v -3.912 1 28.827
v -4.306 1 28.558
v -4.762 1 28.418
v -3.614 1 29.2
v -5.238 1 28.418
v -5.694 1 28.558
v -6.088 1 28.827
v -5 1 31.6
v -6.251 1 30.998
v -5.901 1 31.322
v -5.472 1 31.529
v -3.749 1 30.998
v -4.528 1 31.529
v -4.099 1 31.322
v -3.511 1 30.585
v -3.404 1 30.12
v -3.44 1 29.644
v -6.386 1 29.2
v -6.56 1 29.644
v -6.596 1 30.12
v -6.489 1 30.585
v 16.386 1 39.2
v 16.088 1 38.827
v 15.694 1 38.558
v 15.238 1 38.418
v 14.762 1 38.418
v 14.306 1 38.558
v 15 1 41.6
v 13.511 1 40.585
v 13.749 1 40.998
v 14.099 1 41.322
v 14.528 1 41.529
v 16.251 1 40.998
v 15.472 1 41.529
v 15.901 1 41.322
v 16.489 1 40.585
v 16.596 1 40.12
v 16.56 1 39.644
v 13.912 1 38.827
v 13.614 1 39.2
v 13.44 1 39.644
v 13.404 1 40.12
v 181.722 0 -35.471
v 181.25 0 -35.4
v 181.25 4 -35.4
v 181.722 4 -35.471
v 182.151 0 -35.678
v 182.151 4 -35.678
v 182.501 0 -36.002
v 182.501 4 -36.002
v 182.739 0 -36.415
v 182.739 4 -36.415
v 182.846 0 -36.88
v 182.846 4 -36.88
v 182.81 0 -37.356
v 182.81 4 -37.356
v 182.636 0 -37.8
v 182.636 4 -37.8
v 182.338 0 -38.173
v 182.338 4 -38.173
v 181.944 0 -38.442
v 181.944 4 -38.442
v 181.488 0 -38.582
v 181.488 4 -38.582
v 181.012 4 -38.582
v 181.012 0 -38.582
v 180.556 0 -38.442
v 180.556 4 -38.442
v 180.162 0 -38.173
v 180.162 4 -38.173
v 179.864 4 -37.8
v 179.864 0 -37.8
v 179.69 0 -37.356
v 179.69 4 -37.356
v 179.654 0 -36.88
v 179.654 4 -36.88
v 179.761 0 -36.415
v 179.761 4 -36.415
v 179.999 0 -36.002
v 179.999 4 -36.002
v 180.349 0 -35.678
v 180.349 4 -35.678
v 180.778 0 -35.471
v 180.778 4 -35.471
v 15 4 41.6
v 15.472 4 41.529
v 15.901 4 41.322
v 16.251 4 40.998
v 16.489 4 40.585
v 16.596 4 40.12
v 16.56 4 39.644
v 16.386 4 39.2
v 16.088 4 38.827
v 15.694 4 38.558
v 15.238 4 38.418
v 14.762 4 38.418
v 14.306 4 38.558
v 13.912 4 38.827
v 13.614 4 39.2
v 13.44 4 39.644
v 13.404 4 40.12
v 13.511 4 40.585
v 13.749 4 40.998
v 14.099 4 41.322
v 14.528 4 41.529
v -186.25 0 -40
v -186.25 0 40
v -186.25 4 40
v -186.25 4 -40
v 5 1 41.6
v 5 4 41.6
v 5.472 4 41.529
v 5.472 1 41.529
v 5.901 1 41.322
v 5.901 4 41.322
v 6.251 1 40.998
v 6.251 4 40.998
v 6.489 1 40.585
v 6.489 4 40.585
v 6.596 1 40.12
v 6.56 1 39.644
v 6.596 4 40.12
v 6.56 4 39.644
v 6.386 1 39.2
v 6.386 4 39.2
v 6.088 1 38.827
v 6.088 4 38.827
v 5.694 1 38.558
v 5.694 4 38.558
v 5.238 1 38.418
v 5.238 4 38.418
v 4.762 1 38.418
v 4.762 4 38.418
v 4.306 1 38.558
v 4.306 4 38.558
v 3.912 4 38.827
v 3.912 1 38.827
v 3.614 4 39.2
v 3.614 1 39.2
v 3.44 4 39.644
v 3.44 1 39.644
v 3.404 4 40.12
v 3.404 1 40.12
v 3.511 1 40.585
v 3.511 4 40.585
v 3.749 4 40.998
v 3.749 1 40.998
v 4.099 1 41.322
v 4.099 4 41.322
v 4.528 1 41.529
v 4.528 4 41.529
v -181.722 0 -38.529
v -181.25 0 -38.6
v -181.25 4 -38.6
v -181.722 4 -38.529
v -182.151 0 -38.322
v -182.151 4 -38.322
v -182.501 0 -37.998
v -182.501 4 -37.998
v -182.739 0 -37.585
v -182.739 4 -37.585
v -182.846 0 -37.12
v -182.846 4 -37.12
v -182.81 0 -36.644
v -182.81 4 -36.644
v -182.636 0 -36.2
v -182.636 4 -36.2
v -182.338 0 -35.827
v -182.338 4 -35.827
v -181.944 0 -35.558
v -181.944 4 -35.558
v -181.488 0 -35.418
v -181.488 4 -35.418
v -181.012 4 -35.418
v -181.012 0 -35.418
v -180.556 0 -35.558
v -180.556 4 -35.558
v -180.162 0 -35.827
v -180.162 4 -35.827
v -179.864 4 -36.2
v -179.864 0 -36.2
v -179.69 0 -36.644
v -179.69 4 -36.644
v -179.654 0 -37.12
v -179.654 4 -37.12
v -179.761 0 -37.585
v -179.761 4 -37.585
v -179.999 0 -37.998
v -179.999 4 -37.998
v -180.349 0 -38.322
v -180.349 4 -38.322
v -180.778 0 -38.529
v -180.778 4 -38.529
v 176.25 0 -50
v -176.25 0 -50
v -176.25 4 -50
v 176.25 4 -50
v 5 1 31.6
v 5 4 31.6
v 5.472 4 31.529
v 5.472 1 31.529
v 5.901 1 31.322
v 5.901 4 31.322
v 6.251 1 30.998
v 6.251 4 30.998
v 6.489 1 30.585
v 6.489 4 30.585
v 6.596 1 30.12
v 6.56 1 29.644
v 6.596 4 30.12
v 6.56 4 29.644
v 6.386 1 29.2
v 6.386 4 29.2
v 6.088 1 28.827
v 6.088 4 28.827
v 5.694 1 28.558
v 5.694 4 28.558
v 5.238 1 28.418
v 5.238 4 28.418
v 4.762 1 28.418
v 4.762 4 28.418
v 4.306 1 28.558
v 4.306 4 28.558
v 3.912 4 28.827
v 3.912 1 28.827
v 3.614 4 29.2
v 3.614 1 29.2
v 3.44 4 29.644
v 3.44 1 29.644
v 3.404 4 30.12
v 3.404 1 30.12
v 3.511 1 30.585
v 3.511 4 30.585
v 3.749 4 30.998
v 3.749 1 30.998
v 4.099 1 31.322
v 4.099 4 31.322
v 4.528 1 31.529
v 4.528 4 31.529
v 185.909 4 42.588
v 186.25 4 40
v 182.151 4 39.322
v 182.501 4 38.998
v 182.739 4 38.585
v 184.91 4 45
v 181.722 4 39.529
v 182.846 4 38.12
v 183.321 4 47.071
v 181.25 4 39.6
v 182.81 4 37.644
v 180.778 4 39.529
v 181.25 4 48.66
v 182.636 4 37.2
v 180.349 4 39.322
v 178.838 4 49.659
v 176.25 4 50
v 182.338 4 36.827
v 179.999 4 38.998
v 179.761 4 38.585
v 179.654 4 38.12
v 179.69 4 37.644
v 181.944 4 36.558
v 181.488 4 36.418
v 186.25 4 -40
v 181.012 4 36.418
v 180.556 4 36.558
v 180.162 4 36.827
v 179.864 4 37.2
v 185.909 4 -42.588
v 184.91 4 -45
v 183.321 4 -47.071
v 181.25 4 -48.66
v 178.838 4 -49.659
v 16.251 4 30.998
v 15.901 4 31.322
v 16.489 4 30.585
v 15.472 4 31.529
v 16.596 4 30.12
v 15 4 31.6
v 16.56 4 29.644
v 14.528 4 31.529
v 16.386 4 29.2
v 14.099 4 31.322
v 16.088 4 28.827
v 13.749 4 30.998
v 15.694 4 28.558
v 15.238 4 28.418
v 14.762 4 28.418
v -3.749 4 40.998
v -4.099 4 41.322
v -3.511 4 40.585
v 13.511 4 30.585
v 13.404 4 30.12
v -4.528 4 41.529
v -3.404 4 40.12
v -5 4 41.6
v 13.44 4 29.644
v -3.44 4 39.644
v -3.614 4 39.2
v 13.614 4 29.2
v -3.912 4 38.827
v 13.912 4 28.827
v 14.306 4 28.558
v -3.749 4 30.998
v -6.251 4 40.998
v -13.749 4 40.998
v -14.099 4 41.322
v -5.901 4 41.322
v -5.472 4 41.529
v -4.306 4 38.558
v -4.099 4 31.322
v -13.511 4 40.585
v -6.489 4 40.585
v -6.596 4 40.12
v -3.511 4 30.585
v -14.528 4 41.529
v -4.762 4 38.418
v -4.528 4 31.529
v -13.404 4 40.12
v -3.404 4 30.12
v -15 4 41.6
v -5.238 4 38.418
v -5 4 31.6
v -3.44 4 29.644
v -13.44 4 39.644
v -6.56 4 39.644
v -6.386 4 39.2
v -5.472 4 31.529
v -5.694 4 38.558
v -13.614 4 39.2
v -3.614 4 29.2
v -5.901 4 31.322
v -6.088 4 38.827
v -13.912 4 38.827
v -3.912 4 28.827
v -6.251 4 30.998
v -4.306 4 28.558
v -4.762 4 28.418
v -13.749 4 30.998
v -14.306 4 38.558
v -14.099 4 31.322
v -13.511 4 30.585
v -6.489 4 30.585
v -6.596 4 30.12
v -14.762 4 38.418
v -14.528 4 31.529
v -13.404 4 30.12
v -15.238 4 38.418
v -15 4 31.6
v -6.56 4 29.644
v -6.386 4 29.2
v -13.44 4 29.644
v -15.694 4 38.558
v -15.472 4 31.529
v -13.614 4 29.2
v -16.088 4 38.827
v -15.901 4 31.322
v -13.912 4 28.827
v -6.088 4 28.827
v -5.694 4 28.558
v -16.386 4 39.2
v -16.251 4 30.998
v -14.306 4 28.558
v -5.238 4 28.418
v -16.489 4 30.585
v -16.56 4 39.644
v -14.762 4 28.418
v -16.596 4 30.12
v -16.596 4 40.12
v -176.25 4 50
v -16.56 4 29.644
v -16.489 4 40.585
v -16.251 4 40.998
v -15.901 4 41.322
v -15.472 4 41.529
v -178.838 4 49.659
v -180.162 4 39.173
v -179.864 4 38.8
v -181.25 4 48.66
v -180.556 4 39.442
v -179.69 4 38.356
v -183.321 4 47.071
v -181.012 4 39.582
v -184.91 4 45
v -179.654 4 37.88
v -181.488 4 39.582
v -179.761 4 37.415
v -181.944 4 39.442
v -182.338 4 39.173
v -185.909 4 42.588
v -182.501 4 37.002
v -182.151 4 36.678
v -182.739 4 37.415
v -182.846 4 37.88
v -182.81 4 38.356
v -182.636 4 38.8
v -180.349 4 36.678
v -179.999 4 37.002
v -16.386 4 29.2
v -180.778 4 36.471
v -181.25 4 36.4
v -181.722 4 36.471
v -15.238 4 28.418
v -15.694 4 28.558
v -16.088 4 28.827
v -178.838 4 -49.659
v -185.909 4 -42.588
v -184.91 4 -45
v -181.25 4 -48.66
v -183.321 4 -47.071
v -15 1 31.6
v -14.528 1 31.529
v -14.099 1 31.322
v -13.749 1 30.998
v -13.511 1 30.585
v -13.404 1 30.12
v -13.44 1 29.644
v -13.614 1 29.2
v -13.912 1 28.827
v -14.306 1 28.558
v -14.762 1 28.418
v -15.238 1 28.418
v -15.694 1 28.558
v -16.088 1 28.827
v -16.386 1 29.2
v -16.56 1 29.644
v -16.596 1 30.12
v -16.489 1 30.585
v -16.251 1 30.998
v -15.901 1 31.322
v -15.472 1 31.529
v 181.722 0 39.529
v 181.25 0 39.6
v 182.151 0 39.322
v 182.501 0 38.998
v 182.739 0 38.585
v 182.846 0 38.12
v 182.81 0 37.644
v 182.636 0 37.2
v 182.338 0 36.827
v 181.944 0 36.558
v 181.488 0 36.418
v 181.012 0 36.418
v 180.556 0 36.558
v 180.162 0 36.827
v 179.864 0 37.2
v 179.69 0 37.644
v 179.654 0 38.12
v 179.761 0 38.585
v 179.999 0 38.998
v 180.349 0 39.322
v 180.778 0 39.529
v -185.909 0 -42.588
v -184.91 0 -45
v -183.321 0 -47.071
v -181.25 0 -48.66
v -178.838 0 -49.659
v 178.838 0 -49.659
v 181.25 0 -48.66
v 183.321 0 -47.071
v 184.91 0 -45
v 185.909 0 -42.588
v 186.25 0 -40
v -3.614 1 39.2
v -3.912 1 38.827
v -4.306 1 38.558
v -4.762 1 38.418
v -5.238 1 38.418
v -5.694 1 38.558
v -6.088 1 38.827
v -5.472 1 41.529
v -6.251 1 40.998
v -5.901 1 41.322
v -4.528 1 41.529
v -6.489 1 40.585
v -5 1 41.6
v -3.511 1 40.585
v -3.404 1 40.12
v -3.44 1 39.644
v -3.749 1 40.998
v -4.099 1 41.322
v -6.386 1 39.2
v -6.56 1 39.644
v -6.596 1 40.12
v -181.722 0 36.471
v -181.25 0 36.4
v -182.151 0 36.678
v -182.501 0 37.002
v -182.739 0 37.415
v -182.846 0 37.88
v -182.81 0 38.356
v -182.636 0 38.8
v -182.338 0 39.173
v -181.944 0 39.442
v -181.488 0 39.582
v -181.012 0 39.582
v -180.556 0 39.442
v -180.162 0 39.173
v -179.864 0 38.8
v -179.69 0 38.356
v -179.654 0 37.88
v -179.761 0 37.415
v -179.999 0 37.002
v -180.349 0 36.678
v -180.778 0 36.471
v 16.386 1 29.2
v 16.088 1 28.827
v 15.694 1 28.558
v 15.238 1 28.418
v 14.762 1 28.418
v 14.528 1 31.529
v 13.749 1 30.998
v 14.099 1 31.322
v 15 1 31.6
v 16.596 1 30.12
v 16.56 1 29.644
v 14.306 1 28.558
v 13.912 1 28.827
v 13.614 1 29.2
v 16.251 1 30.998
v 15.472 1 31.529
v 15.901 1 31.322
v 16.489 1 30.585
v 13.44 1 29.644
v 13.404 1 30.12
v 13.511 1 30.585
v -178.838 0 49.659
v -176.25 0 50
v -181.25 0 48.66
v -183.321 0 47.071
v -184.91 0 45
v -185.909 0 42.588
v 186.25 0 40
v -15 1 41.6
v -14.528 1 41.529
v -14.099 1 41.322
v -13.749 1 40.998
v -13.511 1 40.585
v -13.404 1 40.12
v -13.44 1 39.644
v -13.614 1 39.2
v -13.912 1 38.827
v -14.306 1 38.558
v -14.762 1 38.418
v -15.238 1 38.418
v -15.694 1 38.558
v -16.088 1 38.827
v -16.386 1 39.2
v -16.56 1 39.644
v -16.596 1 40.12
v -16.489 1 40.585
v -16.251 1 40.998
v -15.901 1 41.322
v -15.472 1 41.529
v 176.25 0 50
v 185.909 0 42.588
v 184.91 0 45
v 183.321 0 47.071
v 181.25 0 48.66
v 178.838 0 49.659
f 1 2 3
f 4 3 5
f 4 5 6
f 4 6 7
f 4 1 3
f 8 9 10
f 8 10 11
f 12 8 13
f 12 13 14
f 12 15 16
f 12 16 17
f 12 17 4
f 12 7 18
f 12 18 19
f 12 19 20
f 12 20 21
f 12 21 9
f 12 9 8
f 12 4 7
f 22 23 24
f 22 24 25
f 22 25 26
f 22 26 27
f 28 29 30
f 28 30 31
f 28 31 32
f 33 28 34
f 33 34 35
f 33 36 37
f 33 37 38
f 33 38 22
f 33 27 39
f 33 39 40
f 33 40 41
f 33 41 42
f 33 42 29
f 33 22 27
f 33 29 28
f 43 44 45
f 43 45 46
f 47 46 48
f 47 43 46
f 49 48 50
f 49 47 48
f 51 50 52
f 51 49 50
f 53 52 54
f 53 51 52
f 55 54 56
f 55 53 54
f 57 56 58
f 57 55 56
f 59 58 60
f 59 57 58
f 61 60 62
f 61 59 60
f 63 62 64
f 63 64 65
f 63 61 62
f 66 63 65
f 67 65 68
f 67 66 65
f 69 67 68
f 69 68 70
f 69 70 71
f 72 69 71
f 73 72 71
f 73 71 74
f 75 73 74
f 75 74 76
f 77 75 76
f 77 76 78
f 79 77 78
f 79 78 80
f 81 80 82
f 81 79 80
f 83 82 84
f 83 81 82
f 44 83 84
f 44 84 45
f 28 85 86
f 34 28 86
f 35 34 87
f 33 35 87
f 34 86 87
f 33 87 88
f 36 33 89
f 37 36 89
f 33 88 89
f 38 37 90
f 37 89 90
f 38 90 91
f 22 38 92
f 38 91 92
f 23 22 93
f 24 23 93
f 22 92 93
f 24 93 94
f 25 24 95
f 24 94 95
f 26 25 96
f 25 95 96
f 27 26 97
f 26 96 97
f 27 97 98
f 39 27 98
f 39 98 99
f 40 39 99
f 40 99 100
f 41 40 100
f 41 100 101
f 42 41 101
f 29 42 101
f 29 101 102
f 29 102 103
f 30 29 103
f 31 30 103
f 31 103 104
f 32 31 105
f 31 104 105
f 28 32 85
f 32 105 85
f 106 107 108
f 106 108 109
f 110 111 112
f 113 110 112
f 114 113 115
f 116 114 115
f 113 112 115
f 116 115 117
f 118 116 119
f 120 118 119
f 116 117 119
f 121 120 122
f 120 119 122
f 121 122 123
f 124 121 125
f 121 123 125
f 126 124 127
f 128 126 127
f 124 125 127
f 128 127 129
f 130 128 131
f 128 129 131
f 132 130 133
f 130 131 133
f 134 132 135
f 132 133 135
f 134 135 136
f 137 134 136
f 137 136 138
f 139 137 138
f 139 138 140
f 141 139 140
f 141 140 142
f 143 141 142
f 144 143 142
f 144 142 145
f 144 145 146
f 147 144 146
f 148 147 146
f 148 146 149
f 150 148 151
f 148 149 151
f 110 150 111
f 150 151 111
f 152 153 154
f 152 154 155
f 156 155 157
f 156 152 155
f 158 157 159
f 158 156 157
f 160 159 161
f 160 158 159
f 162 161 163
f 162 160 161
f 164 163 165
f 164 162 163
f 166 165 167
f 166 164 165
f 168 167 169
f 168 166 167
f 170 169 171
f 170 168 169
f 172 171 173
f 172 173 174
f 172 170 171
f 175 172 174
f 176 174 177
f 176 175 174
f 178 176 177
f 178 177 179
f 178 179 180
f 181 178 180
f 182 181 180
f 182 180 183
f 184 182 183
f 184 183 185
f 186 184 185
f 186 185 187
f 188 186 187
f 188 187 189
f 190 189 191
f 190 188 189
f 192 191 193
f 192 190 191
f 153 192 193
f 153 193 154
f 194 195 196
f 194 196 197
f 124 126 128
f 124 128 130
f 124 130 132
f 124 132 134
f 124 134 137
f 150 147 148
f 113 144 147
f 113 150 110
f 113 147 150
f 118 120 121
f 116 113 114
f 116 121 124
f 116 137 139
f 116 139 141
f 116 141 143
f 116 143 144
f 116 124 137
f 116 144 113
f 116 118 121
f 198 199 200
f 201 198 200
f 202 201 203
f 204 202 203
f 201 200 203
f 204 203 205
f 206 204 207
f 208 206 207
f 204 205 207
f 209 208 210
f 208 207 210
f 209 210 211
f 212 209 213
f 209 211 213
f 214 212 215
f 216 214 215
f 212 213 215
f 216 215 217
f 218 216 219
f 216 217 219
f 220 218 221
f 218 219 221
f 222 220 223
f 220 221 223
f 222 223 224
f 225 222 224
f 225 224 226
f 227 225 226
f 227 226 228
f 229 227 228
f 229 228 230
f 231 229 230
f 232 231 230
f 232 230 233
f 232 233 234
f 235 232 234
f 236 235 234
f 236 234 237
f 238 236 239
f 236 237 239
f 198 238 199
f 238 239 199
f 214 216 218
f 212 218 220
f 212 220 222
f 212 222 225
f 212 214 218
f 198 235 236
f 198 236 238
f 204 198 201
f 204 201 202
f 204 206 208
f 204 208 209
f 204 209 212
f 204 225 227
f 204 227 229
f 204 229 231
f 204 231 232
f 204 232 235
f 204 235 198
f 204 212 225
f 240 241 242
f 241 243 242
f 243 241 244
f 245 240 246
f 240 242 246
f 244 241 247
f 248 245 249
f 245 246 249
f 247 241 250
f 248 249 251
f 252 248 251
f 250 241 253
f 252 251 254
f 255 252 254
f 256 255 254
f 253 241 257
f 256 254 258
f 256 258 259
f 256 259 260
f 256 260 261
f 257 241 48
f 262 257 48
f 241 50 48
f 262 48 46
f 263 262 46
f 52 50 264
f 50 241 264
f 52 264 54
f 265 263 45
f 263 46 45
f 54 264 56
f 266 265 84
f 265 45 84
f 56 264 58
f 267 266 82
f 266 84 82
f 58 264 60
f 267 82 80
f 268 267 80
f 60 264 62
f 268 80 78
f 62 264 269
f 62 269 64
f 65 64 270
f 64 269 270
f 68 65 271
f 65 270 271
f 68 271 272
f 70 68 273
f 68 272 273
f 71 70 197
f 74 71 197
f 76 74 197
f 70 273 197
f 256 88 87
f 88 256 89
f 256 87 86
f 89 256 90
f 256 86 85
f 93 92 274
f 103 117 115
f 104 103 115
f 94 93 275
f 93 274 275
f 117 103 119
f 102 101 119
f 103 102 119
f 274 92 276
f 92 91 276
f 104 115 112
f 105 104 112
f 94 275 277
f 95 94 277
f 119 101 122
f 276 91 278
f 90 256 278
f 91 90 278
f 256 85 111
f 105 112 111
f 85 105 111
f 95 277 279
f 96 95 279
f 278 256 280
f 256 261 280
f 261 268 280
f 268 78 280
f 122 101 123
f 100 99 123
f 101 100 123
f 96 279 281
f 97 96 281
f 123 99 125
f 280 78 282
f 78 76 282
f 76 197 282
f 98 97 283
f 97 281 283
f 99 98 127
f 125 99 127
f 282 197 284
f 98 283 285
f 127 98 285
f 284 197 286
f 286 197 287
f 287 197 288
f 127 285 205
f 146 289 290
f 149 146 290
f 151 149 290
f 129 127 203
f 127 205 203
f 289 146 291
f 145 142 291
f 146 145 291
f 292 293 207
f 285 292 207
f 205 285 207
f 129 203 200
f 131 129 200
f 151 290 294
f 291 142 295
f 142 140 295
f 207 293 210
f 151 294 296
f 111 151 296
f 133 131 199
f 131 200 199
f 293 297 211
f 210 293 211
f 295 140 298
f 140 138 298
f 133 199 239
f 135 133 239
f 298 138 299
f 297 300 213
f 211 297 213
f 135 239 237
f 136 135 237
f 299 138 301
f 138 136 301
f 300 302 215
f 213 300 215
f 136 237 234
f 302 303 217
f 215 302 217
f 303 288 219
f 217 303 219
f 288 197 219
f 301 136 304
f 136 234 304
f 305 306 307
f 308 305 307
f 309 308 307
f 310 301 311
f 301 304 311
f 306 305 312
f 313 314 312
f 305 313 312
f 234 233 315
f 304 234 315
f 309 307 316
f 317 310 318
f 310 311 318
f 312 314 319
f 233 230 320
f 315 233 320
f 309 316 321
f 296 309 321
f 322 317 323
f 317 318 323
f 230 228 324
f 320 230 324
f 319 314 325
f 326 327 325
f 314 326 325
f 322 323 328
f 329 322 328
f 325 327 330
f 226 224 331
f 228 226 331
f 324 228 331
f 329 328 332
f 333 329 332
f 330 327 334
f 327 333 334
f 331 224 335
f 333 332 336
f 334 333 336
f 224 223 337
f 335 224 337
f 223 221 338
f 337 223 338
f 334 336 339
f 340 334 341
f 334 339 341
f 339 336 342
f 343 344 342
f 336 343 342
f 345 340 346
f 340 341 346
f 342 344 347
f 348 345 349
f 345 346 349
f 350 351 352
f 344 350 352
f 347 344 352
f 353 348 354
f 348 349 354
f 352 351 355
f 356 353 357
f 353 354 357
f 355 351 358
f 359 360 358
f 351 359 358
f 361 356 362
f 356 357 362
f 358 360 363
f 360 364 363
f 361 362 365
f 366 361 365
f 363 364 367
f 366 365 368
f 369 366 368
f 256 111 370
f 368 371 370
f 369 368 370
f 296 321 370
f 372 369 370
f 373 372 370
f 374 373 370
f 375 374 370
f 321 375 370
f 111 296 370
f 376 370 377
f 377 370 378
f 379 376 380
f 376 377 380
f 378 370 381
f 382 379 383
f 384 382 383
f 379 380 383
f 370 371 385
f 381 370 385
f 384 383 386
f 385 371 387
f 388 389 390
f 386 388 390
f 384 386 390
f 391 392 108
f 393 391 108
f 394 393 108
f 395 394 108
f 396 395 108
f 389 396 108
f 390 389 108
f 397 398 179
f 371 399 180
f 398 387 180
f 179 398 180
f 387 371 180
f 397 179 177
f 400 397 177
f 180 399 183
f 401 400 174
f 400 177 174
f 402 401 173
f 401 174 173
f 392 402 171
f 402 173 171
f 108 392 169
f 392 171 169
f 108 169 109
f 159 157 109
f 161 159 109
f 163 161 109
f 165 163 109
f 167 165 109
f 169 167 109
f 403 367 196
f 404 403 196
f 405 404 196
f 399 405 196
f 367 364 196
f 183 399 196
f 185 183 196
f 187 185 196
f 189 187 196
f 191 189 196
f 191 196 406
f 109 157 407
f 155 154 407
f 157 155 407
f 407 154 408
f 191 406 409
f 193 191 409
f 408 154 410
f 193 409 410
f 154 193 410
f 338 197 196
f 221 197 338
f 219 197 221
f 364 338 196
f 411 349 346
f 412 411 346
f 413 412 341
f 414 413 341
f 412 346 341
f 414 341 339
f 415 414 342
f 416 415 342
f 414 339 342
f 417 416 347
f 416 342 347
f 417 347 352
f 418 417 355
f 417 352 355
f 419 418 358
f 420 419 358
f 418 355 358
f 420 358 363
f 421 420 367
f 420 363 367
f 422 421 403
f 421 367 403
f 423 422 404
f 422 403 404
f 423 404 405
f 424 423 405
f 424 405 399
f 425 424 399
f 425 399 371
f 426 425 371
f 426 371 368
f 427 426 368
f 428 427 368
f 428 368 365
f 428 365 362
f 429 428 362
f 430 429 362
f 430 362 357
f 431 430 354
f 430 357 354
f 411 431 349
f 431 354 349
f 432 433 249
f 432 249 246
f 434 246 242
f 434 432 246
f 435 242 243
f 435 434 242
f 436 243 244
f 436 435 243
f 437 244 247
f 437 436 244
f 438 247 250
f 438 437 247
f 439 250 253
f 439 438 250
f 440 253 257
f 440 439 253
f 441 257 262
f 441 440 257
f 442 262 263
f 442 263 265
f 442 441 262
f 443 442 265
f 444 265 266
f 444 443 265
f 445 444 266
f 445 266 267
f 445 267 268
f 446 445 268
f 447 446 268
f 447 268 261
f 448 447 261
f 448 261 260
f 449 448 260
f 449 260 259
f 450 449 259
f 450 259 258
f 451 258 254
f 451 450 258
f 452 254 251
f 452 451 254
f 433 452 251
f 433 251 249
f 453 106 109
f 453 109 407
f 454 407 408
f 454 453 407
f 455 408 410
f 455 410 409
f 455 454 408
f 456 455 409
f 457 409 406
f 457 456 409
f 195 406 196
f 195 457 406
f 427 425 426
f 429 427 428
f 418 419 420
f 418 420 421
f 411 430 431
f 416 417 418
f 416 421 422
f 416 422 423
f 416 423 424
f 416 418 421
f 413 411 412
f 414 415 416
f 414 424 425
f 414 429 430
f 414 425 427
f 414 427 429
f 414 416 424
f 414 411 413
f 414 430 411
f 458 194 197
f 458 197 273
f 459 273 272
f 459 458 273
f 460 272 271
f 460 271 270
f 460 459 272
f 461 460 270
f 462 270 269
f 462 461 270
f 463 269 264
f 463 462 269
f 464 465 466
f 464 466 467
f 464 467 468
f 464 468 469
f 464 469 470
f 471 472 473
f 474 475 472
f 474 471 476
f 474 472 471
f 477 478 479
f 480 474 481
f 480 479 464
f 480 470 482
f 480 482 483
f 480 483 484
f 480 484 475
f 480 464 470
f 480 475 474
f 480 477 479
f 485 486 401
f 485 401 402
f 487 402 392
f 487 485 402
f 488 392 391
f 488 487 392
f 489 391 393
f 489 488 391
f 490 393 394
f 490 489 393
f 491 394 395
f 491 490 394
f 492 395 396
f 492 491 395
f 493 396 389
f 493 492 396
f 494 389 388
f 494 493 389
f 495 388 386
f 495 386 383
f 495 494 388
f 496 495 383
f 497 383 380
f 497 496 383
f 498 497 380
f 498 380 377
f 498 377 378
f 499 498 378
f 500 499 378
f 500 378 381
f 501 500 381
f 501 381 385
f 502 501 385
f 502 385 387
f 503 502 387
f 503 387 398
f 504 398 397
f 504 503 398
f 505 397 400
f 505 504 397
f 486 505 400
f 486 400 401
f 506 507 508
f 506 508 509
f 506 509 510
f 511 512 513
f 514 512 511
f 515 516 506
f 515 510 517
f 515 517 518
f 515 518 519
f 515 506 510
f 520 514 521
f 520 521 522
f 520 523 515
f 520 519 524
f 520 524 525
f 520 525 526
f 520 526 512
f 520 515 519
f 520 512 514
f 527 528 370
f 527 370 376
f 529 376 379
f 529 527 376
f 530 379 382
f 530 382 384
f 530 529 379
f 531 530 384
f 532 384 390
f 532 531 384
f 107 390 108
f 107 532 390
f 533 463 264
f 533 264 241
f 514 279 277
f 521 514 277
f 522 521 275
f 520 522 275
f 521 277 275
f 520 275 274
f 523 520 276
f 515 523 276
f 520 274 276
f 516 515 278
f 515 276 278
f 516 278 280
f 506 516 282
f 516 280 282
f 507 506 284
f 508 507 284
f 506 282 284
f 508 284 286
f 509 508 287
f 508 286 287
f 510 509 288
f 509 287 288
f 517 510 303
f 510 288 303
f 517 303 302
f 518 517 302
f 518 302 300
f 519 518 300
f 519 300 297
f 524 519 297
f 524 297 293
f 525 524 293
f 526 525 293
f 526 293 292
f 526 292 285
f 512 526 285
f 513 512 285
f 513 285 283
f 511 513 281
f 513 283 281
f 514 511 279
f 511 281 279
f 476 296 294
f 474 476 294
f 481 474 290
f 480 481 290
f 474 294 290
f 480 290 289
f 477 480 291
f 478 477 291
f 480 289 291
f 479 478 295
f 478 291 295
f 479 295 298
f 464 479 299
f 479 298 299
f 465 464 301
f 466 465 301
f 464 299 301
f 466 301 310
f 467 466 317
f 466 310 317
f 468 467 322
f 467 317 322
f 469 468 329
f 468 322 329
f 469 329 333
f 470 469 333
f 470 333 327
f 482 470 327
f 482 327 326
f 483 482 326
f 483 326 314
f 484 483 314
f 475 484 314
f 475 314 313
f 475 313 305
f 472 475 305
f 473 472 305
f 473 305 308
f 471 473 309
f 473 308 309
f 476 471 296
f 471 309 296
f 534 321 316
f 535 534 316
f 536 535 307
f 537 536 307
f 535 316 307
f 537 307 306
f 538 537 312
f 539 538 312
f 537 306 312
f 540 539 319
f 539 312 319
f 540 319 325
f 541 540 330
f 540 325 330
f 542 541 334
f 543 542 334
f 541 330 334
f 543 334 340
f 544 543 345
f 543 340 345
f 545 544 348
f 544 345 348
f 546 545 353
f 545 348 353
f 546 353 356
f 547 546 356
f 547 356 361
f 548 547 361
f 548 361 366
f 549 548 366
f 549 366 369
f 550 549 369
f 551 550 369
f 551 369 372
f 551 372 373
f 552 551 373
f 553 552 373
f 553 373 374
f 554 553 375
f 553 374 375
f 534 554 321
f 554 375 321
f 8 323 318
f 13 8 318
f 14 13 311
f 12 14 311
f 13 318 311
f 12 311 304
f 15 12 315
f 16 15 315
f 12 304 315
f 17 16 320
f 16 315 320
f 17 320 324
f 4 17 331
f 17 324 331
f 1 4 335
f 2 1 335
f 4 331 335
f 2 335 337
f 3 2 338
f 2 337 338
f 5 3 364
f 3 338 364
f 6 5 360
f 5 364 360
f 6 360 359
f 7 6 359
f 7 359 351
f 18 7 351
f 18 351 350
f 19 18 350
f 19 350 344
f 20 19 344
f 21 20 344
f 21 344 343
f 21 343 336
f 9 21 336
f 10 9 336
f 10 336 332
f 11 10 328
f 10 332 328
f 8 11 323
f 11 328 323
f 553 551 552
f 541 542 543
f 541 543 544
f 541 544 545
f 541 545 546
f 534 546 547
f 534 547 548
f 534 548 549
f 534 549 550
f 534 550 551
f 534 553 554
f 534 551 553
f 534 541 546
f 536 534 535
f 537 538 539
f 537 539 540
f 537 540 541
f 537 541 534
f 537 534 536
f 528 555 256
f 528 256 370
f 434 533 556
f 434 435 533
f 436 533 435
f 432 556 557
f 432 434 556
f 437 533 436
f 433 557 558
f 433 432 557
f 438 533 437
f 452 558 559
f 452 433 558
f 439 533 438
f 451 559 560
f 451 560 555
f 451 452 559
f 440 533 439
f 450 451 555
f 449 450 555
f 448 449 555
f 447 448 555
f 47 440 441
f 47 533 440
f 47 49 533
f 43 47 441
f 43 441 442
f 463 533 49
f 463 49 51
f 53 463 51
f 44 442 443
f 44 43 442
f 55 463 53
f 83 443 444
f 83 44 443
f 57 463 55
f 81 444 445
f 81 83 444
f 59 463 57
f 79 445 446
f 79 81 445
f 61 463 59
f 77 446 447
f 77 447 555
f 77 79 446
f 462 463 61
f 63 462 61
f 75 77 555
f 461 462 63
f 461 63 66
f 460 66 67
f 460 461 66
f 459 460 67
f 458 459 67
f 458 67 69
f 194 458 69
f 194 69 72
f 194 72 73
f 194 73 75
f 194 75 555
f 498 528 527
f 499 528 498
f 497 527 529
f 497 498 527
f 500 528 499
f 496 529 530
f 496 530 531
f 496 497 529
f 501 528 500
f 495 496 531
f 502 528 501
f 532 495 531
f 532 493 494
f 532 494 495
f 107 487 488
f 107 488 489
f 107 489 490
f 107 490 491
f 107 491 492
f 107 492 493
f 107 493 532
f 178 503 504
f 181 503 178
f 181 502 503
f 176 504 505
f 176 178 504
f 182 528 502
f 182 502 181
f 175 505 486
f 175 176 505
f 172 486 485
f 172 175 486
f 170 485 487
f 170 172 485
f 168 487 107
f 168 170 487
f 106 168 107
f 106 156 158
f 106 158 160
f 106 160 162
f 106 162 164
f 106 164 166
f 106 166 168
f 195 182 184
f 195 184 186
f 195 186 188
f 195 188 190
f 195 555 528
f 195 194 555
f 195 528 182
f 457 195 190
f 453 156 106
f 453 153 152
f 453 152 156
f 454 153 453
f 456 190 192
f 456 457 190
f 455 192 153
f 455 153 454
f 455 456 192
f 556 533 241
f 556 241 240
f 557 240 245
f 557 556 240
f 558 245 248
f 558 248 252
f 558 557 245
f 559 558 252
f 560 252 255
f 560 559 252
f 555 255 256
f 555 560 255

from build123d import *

# Parameters (mm, degrees)
SKETCH_1_R          = 1.6
EXTRUDE_1_DEPTH     = 4
SKETCH_2_R          = 1.6
CUT_EXTRUDE_1_DEPTH = 3


with BuildPart() as part:
    # 草图1 → 凸台-拉伸1 (new body)
    with BuildSketch(Plane(origin=(0, 0, 0), x_dir=(1, 0, 0), z_dir=(0, 1, 0))):
        with BuildLine():
            Line((-176.25, 50), (176.25, 50))
            ThreePointArc((176.25, 50), (183.321067812, 47.071067812), (186.25, 40))
            Line((186.25, 40), (186.25, -40))
            ThreePointArc((186.25, -40), (183.321067812, -47.071067812), (176.25, -50))
            Line((176.25, -50), (-176.25, -50))
            ThreePointArc((-176.25, -50), (-183.321067812, -47.071067812), (-186.25, -40))
            Line((-186.25, -40), (-186.25, 40))
            ThreePointArc((-186.25, 40), (-183.321067812, 47.071067812), (-176.25, 50))
        make_face()
        with Locations(Location((181.25, -38, 0), (0, 0, 270))):
            Circle(SKETCH_1_R, mode=Mode.SUBTRACT)
        with Locations(Location((181.25, 37, 0), (0, 0, 270))):
            Circle(SKETCH_1_R, mode=Mode.SUBTRACT)
        with Locations(Location((-181.25, -38, 0), (0, 0, 90))):
            Circle(SKETCH_1_R, mode=Mode.SUBTRACT)
        with Locations(Location((-181.25, 37, 0), (0, 0, 90))):
            Circle(SKETCH_1_R, mode=Mode.SUBTRACT)
    extrude(amount=EXTRUDE_1_DEPTH)

    # 草图2 → 切除-拉伸1 (cut)
    with BuildSketch(Plane(origin=(0, 4, 0), x_dir=(1, 0, 0), z_dir=(0, 1, 0))):
        with Locations(Location((-15, -30, 0), (0, 0, 270))):
            Circle(SKETCH_2_R)
        with Locations(Location((15, -30, 0), (0, 0, 270))):
            Circle(SKETCH_2_R)
        with Locations(Location((15, -40, 0), (0, 0, 270))):
            Circle(SKETCH_2_R)
        with Locations(Location((-15, -40, 0), (0, 0, 270))):
            Circle(SKETCH_2_R)
        with Locations(Location((-5, -30, 0), (0, 0, 270))):
            Circle(SKETCH_2_R)
        with Locations(Location((5, -30, 0), (0, 0, 270))):
            Circle(SKETCH_2_R)
        with Locations(Location((-5, -40, 0), (0, 0, 270))):
            Circle(SKETCH_2_R)
        with Locations(Location((5, -40, 0), (0, 0, 270))):
            Circle(SKETCH_2_R)
    extrude(amount=-CUT_EXTRUDE_1_DEPTH, mode=Mode.SUBTRACT)


solid = part.part
